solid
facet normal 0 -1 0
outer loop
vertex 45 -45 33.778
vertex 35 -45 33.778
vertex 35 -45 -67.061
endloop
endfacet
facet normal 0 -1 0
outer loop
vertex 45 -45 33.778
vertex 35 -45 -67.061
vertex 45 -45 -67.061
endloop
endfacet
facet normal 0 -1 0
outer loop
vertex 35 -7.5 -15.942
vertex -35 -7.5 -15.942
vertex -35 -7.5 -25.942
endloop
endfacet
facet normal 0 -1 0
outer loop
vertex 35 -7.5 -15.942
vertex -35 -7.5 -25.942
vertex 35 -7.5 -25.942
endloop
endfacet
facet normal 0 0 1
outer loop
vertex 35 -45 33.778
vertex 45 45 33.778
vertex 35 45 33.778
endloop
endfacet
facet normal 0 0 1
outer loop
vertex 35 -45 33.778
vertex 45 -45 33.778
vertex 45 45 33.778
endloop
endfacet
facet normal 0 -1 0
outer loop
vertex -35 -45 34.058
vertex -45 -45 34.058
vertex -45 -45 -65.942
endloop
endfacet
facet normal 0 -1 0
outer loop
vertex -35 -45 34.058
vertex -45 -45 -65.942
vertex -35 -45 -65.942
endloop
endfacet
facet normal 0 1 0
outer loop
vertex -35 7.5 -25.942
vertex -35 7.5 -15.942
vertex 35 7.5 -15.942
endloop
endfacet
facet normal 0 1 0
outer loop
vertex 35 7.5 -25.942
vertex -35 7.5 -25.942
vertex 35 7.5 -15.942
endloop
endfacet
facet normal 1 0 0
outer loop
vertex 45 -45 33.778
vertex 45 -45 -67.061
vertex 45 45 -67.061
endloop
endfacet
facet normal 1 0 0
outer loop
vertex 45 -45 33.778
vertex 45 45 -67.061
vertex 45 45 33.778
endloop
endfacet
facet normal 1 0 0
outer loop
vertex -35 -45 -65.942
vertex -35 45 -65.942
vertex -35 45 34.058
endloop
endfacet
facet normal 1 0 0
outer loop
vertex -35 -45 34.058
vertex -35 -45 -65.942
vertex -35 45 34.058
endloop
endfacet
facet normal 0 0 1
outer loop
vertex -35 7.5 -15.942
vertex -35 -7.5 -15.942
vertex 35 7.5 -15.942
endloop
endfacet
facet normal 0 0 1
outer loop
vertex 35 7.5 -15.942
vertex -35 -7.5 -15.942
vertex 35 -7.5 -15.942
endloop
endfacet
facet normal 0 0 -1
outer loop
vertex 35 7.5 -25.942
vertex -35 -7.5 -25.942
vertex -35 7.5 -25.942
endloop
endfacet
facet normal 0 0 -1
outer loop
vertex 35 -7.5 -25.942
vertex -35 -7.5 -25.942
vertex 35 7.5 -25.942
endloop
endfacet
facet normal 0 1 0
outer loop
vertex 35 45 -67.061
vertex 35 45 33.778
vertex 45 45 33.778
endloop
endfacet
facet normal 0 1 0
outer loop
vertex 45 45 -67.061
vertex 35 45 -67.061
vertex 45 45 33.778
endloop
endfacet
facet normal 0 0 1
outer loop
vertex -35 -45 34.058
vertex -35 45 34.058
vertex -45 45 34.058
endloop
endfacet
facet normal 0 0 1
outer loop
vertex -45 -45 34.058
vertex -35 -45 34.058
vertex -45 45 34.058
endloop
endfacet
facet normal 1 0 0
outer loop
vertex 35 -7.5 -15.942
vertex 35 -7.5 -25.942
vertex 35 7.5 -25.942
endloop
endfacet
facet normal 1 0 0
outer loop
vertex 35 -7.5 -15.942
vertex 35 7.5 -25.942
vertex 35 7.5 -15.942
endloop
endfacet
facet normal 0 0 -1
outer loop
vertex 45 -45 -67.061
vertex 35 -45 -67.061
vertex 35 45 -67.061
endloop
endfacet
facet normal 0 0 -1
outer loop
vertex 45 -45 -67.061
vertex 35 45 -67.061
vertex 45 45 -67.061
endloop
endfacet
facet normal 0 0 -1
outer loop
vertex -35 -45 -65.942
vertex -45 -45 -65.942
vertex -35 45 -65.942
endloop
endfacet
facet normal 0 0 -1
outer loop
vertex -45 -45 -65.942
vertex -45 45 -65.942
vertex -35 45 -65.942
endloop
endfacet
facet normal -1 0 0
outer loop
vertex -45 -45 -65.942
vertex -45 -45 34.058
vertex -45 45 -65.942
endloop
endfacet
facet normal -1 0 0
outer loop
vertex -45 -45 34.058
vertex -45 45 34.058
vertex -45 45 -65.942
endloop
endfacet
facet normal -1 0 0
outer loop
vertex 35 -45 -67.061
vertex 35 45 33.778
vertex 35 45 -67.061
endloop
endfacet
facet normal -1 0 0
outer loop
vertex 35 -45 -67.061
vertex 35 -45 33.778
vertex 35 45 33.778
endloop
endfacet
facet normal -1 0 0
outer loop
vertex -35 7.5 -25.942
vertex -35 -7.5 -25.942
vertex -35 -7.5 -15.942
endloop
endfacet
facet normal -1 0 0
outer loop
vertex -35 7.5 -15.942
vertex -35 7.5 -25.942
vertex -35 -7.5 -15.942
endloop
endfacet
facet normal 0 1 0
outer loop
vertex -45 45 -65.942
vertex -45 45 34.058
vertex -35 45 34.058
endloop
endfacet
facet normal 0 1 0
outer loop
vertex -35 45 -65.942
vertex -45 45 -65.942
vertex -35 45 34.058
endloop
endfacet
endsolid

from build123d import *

# Parameters (mm, degrees)
F1_DEPTH = 45
F0_W     = 70
F0_H     = 10
F2_DEPTH = 7.5


with BuildPart() as f1:
    # F0 (on Front) → F1 (new body, symmetric)
    with BuildSketch(Plane.XZ):
        Polygon((-35, 34.058132), (-45, 34.058132), (-45, -65.941868), (-35, -65.941868), (-35, -25.941868), (-35, -15.941868), align=None)
        Polygon((35, 33.778302), (35, -15.941868), (35, -25.941868), (35, -67.061327), (45, -67.061327), (45, 33.778302), align=None)
    extrude(amount=F1_DEPTH, both=True)


with BuildPart() as f2:
    # F0 (on Front) → F2 (new body, symmetric)
    with BuildSketch(Plane.XZ):
        with Locations((0, -20.941868)):
            Rectangle(F0_W, F0_H)
    extrude(amount=F2_DEPTH, both=True)


solid = Compound([f1.part, f2.part])
